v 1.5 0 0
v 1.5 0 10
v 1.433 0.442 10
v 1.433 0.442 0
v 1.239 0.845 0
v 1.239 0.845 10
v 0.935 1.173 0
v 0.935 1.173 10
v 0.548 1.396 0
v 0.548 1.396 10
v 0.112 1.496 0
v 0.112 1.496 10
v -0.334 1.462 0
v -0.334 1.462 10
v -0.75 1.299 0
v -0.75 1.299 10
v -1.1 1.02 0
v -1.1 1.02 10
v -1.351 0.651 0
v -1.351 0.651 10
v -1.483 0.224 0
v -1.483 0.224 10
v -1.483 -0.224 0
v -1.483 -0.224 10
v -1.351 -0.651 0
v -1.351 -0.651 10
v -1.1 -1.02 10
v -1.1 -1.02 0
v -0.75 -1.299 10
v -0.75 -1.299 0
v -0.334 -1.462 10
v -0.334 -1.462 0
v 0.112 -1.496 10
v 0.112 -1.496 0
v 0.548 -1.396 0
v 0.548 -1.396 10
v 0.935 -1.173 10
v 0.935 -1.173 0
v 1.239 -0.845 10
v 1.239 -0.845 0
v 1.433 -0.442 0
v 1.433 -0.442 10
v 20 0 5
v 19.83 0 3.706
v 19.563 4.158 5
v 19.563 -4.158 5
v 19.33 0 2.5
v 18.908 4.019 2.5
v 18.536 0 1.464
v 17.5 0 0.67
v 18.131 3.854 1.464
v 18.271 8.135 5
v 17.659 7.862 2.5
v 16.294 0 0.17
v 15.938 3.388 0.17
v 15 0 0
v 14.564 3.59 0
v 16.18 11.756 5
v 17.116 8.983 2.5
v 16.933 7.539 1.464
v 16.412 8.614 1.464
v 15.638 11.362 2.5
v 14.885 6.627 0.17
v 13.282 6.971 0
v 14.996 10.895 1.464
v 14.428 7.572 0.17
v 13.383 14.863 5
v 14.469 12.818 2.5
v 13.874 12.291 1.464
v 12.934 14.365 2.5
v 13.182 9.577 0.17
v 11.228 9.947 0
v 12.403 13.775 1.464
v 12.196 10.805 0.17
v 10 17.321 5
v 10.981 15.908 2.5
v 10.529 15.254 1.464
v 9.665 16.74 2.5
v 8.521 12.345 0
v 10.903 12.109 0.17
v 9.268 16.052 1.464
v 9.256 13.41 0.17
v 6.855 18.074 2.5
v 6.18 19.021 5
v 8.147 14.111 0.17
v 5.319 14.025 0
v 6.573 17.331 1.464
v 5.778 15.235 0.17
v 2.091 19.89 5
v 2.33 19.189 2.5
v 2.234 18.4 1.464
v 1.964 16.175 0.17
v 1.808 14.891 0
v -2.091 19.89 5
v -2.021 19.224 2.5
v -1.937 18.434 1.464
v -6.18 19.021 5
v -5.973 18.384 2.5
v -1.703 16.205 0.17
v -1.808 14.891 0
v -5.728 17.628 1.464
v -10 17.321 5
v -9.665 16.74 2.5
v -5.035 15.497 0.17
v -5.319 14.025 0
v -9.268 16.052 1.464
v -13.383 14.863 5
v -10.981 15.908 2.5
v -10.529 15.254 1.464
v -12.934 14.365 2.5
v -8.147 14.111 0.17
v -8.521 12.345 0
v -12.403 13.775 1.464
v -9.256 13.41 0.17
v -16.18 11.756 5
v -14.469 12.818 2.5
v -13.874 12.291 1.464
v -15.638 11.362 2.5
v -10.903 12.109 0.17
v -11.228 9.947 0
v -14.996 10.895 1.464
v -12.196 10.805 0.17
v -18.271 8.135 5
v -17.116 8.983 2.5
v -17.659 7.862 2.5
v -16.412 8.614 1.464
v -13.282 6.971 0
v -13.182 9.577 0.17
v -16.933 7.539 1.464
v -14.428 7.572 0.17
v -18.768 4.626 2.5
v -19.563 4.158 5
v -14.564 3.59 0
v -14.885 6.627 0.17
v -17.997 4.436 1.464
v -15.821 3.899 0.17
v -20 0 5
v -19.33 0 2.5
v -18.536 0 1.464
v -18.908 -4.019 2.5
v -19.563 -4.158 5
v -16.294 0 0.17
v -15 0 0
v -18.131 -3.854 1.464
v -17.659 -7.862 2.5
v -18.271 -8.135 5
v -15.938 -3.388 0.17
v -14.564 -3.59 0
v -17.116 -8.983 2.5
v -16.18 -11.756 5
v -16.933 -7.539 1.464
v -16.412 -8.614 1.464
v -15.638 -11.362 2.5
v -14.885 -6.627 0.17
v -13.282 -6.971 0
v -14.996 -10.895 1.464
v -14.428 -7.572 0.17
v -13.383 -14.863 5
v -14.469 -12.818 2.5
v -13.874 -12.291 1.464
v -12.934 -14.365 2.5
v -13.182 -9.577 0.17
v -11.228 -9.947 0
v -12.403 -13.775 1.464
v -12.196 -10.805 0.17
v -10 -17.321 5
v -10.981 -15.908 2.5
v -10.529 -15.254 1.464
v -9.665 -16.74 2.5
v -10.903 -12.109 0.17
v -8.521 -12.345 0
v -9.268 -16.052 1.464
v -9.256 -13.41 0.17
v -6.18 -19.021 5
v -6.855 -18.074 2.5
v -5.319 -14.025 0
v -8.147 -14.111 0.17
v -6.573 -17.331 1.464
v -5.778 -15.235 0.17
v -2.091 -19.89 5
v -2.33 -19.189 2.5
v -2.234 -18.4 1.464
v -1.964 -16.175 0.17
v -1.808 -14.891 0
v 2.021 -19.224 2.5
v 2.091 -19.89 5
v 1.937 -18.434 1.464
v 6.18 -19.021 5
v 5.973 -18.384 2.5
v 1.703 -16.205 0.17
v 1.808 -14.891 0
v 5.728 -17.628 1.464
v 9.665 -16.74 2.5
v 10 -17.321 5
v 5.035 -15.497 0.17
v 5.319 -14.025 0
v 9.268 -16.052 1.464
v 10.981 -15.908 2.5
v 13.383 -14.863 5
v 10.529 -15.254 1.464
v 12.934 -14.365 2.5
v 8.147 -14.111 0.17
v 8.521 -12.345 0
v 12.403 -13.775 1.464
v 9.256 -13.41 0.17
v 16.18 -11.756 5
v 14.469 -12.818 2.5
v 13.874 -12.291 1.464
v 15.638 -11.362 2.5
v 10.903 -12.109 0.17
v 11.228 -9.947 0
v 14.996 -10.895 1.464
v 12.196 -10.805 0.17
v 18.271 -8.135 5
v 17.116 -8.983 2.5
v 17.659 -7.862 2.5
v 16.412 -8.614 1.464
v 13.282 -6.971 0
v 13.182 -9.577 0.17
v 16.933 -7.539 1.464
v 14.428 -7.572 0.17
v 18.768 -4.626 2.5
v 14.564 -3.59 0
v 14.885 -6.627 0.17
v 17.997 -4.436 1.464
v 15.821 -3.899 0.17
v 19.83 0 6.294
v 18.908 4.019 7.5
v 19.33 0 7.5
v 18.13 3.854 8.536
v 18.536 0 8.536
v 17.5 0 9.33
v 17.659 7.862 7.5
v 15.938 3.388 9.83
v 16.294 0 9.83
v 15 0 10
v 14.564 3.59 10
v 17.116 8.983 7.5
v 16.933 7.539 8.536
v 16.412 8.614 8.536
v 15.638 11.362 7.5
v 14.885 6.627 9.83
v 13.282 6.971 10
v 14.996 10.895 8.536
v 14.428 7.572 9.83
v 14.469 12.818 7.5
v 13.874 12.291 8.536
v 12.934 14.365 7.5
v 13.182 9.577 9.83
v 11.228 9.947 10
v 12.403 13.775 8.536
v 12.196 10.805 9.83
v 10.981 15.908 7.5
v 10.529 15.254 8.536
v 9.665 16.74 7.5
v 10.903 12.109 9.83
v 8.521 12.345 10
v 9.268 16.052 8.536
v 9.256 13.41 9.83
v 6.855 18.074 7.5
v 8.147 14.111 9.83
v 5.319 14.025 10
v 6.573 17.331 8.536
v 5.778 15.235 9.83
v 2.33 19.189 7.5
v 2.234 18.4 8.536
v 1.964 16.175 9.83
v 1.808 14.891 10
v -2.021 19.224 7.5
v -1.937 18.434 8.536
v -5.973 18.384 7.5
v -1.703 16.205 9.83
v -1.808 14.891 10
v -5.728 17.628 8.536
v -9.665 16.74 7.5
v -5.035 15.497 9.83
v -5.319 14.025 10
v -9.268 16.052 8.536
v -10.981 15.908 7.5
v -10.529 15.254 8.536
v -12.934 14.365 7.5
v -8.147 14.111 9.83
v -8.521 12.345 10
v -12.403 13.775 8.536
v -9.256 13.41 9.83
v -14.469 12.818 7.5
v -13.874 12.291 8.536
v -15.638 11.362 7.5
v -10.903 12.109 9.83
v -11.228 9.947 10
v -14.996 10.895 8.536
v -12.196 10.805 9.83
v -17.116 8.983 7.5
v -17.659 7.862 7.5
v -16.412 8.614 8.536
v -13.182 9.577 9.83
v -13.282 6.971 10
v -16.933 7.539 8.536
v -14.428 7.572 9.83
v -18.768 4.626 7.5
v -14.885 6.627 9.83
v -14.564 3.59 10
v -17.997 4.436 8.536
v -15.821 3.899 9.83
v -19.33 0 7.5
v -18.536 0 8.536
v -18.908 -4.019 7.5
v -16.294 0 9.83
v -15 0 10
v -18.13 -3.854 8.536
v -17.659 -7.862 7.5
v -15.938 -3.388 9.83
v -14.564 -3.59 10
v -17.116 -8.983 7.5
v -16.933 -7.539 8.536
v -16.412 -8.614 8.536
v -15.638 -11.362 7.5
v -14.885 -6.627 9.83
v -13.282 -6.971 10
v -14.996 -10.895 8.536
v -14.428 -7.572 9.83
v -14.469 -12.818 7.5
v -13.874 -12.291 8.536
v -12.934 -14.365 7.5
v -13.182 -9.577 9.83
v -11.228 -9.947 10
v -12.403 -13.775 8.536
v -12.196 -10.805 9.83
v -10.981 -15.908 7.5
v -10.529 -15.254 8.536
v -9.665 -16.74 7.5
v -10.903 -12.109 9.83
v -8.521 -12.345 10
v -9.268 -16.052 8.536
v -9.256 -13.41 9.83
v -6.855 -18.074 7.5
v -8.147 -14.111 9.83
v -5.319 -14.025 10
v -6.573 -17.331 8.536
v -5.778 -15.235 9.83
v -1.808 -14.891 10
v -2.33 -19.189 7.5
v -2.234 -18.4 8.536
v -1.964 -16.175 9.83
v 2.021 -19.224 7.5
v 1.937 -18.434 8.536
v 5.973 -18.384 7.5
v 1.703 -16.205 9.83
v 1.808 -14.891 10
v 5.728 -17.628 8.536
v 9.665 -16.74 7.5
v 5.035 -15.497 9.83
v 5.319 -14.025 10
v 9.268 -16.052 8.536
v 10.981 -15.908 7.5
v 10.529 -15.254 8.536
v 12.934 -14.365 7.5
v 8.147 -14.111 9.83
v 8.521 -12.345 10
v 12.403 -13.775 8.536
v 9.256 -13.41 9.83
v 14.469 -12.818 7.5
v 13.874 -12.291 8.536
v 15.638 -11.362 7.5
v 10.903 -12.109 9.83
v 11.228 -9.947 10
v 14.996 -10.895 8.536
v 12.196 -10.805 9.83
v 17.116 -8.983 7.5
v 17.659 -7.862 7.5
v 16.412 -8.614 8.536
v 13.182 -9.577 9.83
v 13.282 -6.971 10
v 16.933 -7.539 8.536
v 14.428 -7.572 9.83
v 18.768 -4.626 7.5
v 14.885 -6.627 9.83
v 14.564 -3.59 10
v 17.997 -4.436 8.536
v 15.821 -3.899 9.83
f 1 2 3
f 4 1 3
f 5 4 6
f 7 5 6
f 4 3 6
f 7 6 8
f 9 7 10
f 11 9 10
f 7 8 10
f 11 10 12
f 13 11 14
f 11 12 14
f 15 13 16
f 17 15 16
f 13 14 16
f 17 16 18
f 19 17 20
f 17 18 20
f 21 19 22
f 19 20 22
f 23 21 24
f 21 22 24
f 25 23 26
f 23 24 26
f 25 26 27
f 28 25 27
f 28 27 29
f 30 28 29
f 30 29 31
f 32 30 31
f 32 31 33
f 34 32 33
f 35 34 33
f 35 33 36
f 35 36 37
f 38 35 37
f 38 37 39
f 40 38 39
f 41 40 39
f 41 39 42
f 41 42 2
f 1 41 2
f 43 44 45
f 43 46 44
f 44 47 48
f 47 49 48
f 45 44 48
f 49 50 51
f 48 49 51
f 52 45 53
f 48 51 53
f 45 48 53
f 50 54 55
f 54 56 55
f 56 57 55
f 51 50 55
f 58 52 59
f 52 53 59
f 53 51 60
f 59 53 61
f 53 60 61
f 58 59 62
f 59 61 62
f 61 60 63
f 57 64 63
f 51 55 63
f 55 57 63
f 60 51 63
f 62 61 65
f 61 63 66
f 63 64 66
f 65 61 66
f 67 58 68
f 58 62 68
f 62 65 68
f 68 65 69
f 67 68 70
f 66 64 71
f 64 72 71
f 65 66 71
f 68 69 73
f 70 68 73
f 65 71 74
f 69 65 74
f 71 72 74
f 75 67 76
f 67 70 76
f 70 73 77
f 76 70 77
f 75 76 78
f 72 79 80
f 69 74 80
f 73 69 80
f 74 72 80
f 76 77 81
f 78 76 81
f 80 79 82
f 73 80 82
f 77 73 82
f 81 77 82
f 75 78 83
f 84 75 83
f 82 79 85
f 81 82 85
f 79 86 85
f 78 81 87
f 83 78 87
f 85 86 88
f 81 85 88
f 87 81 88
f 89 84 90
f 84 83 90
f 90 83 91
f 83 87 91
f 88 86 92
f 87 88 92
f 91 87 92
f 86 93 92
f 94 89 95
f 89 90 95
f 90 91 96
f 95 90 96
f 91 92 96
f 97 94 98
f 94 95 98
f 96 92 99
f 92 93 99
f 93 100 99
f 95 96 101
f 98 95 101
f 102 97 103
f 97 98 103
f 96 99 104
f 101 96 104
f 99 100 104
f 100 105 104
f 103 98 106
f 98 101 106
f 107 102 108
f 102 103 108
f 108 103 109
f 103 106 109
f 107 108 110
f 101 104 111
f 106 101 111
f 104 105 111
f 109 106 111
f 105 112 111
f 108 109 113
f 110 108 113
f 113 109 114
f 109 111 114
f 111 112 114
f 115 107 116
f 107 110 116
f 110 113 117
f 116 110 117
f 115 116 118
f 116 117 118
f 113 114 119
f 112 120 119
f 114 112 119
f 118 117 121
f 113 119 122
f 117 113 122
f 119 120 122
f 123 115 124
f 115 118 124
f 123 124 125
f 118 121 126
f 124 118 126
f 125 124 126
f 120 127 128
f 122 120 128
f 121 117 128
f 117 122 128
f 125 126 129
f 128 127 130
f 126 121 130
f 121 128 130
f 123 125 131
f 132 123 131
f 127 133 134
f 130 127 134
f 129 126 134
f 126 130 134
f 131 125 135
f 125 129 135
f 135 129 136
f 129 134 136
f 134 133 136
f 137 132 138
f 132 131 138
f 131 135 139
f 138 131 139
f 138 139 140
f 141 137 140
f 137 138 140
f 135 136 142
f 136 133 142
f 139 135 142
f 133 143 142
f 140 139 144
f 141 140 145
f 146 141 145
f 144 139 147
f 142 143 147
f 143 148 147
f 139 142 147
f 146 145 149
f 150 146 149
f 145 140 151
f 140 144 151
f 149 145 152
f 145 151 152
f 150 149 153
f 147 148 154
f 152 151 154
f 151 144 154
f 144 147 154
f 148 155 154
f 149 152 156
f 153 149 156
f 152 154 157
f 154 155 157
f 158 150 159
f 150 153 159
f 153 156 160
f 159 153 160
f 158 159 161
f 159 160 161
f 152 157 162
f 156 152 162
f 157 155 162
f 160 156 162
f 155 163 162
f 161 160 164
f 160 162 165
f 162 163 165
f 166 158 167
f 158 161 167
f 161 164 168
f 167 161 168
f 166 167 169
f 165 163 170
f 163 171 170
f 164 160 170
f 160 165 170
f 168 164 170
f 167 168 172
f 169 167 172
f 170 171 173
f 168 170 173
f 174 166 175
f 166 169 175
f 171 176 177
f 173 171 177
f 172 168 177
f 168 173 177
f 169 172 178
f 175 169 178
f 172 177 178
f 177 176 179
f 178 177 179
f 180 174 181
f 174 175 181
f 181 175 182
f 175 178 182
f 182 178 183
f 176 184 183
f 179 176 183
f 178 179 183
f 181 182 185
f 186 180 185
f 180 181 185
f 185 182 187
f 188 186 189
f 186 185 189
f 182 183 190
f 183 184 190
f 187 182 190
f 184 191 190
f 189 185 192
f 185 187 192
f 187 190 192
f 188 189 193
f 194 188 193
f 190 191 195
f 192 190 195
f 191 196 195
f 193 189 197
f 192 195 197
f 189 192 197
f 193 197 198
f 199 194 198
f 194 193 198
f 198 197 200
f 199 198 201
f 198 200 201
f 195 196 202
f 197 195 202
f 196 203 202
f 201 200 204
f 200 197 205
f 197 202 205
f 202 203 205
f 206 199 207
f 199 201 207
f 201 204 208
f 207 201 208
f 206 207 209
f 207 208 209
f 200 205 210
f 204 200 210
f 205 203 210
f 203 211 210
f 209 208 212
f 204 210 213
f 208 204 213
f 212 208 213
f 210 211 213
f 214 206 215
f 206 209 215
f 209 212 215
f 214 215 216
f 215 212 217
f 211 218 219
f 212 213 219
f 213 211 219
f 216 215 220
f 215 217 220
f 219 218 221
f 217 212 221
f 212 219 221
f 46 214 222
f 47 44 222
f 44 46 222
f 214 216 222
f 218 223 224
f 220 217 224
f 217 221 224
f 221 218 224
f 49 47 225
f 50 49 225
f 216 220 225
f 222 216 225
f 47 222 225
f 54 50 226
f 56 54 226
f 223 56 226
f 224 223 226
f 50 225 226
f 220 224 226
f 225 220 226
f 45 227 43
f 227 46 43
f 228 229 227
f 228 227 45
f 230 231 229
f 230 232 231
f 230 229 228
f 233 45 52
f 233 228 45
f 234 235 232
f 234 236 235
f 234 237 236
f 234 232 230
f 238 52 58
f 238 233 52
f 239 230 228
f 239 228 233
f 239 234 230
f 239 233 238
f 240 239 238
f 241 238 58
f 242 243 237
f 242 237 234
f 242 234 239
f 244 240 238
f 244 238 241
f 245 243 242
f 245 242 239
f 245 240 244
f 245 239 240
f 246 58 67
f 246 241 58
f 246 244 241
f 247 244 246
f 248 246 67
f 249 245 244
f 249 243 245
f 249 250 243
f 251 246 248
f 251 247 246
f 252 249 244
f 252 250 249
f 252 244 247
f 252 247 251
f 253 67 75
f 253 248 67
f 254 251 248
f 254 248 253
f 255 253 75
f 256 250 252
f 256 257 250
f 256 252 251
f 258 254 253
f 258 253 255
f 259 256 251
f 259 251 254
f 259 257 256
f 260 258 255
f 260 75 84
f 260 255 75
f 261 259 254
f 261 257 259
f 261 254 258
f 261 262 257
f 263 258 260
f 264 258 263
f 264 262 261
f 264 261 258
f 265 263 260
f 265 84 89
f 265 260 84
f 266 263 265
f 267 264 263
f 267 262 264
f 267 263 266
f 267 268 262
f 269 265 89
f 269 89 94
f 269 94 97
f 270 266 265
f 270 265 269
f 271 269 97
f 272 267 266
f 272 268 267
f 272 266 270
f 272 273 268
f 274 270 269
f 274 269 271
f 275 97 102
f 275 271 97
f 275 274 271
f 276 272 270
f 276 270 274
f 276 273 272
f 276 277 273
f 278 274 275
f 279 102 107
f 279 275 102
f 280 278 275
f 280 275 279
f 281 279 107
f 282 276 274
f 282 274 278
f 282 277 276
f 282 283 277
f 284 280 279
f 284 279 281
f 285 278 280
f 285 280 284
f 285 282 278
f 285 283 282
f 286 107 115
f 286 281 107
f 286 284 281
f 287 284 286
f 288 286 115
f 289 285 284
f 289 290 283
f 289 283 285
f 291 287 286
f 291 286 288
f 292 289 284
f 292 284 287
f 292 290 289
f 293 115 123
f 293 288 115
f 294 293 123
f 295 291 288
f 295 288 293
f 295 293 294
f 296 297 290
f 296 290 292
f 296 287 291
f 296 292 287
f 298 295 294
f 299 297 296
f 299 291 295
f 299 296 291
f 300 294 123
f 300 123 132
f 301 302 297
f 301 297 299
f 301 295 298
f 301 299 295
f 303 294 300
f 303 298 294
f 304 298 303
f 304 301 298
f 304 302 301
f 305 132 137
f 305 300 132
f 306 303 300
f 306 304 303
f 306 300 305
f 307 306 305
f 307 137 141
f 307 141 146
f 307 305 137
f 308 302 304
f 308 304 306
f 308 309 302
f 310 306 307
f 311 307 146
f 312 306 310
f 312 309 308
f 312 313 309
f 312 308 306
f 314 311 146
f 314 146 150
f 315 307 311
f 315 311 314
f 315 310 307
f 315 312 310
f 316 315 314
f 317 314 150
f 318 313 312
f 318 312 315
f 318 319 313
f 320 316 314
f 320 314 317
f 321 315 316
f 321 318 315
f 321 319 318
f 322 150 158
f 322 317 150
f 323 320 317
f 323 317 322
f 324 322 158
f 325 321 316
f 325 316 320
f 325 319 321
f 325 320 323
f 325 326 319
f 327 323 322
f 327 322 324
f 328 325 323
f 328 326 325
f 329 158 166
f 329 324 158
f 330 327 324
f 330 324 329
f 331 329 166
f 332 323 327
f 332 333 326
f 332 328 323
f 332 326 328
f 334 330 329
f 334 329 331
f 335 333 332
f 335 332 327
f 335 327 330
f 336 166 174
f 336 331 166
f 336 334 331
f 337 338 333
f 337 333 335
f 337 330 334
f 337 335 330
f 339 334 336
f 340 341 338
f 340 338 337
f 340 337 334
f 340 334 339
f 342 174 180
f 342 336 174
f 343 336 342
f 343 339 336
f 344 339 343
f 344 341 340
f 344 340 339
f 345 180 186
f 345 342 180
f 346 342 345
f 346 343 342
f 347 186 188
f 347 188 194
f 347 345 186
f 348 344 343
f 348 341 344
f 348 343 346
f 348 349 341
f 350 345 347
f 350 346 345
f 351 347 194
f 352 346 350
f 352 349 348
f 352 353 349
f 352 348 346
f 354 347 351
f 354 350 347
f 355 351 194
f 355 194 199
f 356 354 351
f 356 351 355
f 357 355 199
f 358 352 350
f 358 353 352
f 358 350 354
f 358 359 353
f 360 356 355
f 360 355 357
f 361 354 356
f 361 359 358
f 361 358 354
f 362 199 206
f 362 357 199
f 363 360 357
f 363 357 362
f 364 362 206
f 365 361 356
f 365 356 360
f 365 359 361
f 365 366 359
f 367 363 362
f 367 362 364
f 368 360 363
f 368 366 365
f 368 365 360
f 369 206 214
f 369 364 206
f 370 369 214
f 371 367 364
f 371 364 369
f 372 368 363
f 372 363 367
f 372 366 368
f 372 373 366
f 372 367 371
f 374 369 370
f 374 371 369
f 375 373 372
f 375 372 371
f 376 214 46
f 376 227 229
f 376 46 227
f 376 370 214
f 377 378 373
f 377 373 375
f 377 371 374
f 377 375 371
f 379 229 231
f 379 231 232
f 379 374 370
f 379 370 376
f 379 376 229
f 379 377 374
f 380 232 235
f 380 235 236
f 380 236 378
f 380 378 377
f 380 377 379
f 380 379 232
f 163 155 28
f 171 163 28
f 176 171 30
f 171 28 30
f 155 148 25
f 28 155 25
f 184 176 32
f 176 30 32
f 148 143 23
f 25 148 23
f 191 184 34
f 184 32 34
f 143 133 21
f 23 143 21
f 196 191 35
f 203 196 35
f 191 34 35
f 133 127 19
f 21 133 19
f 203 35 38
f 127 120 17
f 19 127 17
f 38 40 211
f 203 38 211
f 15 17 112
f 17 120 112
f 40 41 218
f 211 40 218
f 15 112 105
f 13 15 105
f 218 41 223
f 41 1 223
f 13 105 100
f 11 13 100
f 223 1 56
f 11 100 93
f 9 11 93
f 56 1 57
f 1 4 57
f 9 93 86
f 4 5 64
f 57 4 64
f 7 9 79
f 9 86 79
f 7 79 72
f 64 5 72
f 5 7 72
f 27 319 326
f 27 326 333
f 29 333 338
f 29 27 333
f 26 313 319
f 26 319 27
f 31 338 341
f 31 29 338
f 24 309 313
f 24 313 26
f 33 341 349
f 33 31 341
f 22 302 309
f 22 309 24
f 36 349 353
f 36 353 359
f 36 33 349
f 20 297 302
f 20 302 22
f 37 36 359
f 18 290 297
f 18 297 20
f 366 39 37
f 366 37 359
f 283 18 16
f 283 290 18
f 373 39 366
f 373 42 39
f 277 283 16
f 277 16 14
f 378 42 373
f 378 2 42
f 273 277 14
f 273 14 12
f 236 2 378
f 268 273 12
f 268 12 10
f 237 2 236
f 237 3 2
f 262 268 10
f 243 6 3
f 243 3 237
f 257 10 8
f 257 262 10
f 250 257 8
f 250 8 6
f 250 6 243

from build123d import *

# Parameters (mm, degrees)
SKETCH1_R           = 20
BOSS_EXTRUDE1_DEPTH = 10
FILLET1_R           = 5
FILLET2_R           = 5
SKETCH2_R           = 1.5
CUT_EXTRUDE1_DEPTH  = 31.000000133


with BuildPart() as part:
    # Sketch1 → Boss-Extrude1 (new body)
    with BuildSketch(Plane.XY):
        Circle(SKETCH1_R)
    extrude(amount=BOSS_EXTRUDE1_DEPTH)

    # Fillet1
    fillet1_edges = [part.edges().sort_by_distance(p)[0] for p in [
        (-20, 0, 10),
    ]]
    fillet(fillet1_edges, radius=FILLET1_R)

    # Fillet2
    fillet2_edges = [part.edges().sort_by_distance(p)[0] for p in [
        (-20, 0, 0),
    ]]
    fillet(fillet2_edges, radius=FILLET2_R - 0.0001)  # a hair under: the kernel refuses the full size

    # Sketch2 → Cut-Extrude1 (cut, through all)
    with BuildSketch(Plane.XY.offset(10)):
        Circle(SKETCH2_R)
    extrude(amount=-CUT_EXTRUDE1_DEPTH, mode=Mode.SUBTRACT)


solid = part.part
